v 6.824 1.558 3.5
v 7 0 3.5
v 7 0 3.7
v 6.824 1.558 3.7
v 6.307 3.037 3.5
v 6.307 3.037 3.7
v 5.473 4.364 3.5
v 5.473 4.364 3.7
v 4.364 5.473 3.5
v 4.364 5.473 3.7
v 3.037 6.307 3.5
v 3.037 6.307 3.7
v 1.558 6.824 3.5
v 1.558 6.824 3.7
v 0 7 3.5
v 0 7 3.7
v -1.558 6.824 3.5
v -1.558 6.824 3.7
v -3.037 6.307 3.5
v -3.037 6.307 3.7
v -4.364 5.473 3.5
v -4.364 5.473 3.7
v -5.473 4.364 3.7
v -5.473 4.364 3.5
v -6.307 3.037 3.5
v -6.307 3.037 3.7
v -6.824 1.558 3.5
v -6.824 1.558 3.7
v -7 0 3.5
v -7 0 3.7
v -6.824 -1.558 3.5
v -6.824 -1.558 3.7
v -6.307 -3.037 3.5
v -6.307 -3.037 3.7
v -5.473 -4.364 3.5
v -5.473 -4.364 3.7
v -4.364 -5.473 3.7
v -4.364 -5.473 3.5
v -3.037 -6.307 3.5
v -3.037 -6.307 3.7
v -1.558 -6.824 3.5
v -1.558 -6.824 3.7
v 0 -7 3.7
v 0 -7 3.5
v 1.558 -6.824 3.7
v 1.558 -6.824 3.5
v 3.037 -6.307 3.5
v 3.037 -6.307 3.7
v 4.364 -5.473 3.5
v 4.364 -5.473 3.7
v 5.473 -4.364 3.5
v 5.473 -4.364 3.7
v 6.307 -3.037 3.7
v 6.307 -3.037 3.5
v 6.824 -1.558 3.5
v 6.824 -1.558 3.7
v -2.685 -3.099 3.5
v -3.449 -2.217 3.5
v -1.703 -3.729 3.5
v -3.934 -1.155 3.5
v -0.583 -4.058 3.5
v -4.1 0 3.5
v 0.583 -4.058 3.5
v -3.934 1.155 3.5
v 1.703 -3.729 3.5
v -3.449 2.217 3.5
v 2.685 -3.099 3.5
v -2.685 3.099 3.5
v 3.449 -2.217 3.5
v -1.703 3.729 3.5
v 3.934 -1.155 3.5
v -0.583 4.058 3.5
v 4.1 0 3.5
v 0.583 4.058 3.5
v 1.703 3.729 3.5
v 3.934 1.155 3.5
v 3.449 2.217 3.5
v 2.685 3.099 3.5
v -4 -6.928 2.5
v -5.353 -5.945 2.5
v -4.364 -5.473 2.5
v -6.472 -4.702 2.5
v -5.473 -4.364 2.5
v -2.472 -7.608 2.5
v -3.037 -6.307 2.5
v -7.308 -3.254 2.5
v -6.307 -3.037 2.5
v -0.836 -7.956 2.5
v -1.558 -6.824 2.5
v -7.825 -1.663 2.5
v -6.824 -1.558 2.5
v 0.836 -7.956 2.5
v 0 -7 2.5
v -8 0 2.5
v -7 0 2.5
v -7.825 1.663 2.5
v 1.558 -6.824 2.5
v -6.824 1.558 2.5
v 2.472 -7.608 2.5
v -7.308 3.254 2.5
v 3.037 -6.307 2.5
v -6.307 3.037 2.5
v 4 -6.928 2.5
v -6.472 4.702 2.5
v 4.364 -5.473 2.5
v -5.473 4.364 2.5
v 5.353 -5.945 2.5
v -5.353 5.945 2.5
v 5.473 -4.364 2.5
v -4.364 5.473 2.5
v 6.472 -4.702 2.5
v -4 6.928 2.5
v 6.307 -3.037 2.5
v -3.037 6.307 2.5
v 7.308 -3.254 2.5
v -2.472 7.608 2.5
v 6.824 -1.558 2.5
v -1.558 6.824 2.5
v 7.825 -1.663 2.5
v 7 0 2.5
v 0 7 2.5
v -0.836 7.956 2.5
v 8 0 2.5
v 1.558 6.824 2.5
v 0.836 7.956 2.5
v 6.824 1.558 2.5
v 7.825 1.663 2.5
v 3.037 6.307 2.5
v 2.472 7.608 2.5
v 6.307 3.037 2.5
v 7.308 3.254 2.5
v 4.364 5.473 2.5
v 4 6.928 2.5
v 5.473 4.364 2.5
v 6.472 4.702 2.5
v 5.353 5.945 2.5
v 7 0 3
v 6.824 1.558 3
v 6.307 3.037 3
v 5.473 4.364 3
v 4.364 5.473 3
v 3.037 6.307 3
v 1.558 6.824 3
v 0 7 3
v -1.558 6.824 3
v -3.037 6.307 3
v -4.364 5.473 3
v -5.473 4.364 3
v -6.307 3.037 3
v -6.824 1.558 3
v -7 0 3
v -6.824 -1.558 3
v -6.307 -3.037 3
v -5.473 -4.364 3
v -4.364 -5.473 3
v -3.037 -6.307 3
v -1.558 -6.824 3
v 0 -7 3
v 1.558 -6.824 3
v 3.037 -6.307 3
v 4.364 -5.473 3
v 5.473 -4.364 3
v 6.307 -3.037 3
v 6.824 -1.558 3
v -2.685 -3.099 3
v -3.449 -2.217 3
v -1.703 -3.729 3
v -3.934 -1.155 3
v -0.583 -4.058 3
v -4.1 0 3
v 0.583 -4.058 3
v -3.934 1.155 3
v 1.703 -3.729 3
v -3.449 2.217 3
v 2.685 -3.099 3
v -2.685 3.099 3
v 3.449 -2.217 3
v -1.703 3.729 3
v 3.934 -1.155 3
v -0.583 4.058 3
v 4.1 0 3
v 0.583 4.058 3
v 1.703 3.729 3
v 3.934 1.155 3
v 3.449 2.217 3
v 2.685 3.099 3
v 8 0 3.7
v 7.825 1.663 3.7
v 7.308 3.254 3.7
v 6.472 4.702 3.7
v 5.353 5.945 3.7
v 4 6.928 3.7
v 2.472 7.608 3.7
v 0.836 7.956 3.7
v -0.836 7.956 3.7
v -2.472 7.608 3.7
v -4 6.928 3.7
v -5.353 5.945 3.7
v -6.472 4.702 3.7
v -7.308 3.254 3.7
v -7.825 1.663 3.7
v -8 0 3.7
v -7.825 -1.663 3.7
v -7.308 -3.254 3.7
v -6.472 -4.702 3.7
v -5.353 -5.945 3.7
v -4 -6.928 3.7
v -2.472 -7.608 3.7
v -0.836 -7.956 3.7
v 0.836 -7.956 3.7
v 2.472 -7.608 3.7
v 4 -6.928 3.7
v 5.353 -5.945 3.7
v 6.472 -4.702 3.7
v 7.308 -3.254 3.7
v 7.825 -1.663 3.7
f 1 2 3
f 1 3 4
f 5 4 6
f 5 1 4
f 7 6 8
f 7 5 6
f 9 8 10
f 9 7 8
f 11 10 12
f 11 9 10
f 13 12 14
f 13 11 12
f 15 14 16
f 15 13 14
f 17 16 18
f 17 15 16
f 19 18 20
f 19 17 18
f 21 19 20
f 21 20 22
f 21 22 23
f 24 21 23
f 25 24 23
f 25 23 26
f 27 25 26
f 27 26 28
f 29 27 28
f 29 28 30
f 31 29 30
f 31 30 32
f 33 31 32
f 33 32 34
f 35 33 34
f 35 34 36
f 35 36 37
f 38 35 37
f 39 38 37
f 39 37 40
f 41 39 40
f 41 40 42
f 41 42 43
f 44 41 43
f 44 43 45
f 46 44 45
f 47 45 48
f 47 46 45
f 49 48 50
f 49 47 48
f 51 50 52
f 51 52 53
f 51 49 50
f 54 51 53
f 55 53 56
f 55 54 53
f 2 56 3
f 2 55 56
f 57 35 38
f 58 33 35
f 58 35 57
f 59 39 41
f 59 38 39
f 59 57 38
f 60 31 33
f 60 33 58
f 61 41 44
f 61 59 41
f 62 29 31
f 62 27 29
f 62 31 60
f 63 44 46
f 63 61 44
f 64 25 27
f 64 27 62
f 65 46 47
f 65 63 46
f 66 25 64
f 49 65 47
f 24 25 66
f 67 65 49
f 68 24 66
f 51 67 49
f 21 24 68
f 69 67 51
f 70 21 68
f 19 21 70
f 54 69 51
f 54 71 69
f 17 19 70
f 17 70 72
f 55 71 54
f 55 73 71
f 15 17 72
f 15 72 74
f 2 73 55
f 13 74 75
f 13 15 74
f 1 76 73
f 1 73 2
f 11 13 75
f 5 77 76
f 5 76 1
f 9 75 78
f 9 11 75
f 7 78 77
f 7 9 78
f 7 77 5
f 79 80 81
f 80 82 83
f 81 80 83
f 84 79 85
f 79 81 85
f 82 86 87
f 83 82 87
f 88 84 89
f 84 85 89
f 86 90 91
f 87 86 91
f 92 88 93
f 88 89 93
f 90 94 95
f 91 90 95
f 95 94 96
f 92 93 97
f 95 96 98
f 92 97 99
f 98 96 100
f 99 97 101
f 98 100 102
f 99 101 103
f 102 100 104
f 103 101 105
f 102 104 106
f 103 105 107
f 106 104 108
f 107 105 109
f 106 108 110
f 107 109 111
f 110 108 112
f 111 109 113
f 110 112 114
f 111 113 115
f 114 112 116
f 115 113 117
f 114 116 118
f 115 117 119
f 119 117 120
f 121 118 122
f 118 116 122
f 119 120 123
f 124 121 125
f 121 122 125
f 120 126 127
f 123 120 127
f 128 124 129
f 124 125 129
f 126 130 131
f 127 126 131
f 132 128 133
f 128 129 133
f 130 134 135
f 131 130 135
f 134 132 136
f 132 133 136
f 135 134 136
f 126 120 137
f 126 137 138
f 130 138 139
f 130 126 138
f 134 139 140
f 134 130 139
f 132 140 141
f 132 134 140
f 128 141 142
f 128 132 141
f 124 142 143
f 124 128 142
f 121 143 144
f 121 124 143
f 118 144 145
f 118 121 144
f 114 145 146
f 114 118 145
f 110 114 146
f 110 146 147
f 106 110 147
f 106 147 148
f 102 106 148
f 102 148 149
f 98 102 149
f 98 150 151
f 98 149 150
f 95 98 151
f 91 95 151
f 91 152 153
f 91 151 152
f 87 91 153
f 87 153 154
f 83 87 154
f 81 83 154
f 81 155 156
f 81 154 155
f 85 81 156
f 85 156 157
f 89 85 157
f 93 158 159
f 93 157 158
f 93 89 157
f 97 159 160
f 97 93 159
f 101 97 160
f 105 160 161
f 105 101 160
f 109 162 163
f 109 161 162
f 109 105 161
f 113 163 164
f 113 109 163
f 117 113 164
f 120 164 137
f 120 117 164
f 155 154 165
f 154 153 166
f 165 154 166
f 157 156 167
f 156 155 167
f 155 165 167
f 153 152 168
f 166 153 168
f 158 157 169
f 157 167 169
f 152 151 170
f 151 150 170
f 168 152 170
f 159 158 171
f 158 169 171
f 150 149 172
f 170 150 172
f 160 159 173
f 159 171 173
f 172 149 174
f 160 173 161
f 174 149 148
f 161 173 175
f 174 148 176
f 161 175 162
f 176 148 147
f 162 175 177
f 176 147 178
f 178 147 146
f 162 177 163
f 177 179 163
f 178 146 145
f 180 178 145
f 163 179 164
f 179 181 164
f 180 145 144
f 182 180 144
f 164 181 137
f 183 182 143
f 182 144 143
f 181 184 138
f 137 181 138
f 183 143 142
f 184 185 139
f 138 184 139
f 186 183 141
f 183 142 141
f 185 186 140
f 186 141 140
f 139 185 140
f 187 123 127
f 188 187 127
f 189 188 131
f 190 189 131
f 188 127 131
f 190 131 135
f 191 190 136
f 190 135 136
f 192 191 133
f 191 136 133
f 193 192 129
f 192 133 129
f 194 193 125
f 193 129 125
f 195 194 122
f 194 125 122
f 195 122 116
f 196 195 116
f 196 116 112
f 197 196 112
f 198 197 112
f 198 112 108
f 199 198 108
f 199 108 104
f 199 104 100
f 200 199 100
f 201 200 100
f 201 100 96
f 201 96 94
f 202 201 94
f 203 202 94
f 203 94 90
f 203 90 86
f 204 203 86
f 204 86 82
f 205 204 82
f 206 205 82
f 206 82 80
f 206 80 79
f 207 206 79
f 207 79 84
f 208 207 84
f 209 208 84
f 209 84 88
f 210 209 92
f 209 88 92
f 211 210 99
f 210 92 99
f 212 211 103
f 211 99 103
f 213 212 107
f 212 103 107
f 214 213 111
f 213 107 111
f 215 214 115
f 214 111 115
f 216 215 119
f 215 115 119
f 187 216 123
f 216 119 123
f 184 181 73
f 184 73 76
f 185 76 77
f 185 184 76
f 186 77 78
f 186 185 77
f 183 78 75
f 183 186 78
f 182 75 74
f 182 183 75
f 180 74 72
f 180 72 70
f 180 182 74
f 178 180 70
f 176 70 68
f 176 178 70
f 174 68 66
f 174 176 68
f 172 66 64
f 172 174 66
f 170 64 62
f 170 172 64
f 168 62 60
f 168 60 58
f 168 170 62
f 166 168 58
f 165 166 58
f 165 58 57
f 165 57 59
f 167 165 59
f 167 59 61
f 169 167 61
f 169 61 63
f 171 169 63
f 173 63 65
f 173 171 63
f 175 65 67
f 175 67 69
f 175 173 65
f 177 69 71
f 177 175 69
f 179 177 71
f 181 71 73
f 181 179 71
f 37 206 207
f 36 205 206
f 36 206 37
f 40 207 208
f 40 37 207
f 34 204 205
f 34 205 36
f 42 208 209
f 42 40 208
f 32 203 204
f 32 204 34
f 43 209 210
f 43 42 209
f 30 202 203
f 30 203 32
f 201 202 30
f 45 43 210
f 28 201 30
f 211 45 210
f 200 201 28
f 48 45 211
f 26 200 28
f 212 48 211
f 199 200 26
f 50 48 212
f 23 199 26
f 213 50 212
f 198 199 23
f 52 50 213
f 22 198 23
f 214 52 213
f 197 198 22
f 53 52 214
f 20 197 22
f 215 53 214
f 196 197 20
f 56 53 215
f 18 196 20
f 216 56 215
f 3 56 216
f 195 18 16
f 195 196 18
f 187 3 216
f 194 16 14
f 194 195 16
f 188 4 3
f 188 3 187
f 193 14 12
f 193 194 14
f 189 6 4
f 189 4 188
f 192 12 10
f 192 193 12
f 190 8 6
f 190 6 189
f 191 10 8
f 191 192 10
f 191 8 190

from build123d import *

# Parameters (mm, degrees)
OUTER_FLANGE_CONTACT_ANNULUS_ID8P2_START = 3
SKETCH1_R                                = 8
SKETCH1_R_2                              = 4.1
OUTER_FLANGE_CONTACT_ANNULUS_ID8P2_DEPTH = 0.5
M14X0P5_INTERNAL_THREAD_ENVELOPE_START   = 2.5
SKETCH2_R                                = 8
SKETCH2_R_2                              = 7
M14X0P5_INTERNAL_THREAD_ENVELOPE_DEPTH   = 1.2


with BuildPart() as part:
    # Sketch1 → Outer_Flange_Contact_Annulus_ID8p2 (new body)
    with BuildSketch(Plane.XY.offset(OUTER_FLANGE_CONTACT_ANNULUS_ID8P2_START)):
        Circle(SKETCH1_R)
        Circle(SKETCH1_R_2, mode=Mode.SUBTRACT)
    extrude(amount=OUTER_FLANGE_CONTACT_ANNULUS_ID8P2_DEPTH)

    # Sketch2 → M14x0p5_Internal_Thread_Envelope (add)
    with BuildSketch(Plane.XY.offset(M14X0P5_INTERNAL_THREAD_ENVELOPE_START)):
        Circle(SKETCH2_R)
        Circle(SKETCH2_R_2, mode=Mode.SUBTRACT)
    extrude(amount=M14X0P5_INTERNAL_THREAD_ENVELOPE_DEPTH)


solid = part.part
